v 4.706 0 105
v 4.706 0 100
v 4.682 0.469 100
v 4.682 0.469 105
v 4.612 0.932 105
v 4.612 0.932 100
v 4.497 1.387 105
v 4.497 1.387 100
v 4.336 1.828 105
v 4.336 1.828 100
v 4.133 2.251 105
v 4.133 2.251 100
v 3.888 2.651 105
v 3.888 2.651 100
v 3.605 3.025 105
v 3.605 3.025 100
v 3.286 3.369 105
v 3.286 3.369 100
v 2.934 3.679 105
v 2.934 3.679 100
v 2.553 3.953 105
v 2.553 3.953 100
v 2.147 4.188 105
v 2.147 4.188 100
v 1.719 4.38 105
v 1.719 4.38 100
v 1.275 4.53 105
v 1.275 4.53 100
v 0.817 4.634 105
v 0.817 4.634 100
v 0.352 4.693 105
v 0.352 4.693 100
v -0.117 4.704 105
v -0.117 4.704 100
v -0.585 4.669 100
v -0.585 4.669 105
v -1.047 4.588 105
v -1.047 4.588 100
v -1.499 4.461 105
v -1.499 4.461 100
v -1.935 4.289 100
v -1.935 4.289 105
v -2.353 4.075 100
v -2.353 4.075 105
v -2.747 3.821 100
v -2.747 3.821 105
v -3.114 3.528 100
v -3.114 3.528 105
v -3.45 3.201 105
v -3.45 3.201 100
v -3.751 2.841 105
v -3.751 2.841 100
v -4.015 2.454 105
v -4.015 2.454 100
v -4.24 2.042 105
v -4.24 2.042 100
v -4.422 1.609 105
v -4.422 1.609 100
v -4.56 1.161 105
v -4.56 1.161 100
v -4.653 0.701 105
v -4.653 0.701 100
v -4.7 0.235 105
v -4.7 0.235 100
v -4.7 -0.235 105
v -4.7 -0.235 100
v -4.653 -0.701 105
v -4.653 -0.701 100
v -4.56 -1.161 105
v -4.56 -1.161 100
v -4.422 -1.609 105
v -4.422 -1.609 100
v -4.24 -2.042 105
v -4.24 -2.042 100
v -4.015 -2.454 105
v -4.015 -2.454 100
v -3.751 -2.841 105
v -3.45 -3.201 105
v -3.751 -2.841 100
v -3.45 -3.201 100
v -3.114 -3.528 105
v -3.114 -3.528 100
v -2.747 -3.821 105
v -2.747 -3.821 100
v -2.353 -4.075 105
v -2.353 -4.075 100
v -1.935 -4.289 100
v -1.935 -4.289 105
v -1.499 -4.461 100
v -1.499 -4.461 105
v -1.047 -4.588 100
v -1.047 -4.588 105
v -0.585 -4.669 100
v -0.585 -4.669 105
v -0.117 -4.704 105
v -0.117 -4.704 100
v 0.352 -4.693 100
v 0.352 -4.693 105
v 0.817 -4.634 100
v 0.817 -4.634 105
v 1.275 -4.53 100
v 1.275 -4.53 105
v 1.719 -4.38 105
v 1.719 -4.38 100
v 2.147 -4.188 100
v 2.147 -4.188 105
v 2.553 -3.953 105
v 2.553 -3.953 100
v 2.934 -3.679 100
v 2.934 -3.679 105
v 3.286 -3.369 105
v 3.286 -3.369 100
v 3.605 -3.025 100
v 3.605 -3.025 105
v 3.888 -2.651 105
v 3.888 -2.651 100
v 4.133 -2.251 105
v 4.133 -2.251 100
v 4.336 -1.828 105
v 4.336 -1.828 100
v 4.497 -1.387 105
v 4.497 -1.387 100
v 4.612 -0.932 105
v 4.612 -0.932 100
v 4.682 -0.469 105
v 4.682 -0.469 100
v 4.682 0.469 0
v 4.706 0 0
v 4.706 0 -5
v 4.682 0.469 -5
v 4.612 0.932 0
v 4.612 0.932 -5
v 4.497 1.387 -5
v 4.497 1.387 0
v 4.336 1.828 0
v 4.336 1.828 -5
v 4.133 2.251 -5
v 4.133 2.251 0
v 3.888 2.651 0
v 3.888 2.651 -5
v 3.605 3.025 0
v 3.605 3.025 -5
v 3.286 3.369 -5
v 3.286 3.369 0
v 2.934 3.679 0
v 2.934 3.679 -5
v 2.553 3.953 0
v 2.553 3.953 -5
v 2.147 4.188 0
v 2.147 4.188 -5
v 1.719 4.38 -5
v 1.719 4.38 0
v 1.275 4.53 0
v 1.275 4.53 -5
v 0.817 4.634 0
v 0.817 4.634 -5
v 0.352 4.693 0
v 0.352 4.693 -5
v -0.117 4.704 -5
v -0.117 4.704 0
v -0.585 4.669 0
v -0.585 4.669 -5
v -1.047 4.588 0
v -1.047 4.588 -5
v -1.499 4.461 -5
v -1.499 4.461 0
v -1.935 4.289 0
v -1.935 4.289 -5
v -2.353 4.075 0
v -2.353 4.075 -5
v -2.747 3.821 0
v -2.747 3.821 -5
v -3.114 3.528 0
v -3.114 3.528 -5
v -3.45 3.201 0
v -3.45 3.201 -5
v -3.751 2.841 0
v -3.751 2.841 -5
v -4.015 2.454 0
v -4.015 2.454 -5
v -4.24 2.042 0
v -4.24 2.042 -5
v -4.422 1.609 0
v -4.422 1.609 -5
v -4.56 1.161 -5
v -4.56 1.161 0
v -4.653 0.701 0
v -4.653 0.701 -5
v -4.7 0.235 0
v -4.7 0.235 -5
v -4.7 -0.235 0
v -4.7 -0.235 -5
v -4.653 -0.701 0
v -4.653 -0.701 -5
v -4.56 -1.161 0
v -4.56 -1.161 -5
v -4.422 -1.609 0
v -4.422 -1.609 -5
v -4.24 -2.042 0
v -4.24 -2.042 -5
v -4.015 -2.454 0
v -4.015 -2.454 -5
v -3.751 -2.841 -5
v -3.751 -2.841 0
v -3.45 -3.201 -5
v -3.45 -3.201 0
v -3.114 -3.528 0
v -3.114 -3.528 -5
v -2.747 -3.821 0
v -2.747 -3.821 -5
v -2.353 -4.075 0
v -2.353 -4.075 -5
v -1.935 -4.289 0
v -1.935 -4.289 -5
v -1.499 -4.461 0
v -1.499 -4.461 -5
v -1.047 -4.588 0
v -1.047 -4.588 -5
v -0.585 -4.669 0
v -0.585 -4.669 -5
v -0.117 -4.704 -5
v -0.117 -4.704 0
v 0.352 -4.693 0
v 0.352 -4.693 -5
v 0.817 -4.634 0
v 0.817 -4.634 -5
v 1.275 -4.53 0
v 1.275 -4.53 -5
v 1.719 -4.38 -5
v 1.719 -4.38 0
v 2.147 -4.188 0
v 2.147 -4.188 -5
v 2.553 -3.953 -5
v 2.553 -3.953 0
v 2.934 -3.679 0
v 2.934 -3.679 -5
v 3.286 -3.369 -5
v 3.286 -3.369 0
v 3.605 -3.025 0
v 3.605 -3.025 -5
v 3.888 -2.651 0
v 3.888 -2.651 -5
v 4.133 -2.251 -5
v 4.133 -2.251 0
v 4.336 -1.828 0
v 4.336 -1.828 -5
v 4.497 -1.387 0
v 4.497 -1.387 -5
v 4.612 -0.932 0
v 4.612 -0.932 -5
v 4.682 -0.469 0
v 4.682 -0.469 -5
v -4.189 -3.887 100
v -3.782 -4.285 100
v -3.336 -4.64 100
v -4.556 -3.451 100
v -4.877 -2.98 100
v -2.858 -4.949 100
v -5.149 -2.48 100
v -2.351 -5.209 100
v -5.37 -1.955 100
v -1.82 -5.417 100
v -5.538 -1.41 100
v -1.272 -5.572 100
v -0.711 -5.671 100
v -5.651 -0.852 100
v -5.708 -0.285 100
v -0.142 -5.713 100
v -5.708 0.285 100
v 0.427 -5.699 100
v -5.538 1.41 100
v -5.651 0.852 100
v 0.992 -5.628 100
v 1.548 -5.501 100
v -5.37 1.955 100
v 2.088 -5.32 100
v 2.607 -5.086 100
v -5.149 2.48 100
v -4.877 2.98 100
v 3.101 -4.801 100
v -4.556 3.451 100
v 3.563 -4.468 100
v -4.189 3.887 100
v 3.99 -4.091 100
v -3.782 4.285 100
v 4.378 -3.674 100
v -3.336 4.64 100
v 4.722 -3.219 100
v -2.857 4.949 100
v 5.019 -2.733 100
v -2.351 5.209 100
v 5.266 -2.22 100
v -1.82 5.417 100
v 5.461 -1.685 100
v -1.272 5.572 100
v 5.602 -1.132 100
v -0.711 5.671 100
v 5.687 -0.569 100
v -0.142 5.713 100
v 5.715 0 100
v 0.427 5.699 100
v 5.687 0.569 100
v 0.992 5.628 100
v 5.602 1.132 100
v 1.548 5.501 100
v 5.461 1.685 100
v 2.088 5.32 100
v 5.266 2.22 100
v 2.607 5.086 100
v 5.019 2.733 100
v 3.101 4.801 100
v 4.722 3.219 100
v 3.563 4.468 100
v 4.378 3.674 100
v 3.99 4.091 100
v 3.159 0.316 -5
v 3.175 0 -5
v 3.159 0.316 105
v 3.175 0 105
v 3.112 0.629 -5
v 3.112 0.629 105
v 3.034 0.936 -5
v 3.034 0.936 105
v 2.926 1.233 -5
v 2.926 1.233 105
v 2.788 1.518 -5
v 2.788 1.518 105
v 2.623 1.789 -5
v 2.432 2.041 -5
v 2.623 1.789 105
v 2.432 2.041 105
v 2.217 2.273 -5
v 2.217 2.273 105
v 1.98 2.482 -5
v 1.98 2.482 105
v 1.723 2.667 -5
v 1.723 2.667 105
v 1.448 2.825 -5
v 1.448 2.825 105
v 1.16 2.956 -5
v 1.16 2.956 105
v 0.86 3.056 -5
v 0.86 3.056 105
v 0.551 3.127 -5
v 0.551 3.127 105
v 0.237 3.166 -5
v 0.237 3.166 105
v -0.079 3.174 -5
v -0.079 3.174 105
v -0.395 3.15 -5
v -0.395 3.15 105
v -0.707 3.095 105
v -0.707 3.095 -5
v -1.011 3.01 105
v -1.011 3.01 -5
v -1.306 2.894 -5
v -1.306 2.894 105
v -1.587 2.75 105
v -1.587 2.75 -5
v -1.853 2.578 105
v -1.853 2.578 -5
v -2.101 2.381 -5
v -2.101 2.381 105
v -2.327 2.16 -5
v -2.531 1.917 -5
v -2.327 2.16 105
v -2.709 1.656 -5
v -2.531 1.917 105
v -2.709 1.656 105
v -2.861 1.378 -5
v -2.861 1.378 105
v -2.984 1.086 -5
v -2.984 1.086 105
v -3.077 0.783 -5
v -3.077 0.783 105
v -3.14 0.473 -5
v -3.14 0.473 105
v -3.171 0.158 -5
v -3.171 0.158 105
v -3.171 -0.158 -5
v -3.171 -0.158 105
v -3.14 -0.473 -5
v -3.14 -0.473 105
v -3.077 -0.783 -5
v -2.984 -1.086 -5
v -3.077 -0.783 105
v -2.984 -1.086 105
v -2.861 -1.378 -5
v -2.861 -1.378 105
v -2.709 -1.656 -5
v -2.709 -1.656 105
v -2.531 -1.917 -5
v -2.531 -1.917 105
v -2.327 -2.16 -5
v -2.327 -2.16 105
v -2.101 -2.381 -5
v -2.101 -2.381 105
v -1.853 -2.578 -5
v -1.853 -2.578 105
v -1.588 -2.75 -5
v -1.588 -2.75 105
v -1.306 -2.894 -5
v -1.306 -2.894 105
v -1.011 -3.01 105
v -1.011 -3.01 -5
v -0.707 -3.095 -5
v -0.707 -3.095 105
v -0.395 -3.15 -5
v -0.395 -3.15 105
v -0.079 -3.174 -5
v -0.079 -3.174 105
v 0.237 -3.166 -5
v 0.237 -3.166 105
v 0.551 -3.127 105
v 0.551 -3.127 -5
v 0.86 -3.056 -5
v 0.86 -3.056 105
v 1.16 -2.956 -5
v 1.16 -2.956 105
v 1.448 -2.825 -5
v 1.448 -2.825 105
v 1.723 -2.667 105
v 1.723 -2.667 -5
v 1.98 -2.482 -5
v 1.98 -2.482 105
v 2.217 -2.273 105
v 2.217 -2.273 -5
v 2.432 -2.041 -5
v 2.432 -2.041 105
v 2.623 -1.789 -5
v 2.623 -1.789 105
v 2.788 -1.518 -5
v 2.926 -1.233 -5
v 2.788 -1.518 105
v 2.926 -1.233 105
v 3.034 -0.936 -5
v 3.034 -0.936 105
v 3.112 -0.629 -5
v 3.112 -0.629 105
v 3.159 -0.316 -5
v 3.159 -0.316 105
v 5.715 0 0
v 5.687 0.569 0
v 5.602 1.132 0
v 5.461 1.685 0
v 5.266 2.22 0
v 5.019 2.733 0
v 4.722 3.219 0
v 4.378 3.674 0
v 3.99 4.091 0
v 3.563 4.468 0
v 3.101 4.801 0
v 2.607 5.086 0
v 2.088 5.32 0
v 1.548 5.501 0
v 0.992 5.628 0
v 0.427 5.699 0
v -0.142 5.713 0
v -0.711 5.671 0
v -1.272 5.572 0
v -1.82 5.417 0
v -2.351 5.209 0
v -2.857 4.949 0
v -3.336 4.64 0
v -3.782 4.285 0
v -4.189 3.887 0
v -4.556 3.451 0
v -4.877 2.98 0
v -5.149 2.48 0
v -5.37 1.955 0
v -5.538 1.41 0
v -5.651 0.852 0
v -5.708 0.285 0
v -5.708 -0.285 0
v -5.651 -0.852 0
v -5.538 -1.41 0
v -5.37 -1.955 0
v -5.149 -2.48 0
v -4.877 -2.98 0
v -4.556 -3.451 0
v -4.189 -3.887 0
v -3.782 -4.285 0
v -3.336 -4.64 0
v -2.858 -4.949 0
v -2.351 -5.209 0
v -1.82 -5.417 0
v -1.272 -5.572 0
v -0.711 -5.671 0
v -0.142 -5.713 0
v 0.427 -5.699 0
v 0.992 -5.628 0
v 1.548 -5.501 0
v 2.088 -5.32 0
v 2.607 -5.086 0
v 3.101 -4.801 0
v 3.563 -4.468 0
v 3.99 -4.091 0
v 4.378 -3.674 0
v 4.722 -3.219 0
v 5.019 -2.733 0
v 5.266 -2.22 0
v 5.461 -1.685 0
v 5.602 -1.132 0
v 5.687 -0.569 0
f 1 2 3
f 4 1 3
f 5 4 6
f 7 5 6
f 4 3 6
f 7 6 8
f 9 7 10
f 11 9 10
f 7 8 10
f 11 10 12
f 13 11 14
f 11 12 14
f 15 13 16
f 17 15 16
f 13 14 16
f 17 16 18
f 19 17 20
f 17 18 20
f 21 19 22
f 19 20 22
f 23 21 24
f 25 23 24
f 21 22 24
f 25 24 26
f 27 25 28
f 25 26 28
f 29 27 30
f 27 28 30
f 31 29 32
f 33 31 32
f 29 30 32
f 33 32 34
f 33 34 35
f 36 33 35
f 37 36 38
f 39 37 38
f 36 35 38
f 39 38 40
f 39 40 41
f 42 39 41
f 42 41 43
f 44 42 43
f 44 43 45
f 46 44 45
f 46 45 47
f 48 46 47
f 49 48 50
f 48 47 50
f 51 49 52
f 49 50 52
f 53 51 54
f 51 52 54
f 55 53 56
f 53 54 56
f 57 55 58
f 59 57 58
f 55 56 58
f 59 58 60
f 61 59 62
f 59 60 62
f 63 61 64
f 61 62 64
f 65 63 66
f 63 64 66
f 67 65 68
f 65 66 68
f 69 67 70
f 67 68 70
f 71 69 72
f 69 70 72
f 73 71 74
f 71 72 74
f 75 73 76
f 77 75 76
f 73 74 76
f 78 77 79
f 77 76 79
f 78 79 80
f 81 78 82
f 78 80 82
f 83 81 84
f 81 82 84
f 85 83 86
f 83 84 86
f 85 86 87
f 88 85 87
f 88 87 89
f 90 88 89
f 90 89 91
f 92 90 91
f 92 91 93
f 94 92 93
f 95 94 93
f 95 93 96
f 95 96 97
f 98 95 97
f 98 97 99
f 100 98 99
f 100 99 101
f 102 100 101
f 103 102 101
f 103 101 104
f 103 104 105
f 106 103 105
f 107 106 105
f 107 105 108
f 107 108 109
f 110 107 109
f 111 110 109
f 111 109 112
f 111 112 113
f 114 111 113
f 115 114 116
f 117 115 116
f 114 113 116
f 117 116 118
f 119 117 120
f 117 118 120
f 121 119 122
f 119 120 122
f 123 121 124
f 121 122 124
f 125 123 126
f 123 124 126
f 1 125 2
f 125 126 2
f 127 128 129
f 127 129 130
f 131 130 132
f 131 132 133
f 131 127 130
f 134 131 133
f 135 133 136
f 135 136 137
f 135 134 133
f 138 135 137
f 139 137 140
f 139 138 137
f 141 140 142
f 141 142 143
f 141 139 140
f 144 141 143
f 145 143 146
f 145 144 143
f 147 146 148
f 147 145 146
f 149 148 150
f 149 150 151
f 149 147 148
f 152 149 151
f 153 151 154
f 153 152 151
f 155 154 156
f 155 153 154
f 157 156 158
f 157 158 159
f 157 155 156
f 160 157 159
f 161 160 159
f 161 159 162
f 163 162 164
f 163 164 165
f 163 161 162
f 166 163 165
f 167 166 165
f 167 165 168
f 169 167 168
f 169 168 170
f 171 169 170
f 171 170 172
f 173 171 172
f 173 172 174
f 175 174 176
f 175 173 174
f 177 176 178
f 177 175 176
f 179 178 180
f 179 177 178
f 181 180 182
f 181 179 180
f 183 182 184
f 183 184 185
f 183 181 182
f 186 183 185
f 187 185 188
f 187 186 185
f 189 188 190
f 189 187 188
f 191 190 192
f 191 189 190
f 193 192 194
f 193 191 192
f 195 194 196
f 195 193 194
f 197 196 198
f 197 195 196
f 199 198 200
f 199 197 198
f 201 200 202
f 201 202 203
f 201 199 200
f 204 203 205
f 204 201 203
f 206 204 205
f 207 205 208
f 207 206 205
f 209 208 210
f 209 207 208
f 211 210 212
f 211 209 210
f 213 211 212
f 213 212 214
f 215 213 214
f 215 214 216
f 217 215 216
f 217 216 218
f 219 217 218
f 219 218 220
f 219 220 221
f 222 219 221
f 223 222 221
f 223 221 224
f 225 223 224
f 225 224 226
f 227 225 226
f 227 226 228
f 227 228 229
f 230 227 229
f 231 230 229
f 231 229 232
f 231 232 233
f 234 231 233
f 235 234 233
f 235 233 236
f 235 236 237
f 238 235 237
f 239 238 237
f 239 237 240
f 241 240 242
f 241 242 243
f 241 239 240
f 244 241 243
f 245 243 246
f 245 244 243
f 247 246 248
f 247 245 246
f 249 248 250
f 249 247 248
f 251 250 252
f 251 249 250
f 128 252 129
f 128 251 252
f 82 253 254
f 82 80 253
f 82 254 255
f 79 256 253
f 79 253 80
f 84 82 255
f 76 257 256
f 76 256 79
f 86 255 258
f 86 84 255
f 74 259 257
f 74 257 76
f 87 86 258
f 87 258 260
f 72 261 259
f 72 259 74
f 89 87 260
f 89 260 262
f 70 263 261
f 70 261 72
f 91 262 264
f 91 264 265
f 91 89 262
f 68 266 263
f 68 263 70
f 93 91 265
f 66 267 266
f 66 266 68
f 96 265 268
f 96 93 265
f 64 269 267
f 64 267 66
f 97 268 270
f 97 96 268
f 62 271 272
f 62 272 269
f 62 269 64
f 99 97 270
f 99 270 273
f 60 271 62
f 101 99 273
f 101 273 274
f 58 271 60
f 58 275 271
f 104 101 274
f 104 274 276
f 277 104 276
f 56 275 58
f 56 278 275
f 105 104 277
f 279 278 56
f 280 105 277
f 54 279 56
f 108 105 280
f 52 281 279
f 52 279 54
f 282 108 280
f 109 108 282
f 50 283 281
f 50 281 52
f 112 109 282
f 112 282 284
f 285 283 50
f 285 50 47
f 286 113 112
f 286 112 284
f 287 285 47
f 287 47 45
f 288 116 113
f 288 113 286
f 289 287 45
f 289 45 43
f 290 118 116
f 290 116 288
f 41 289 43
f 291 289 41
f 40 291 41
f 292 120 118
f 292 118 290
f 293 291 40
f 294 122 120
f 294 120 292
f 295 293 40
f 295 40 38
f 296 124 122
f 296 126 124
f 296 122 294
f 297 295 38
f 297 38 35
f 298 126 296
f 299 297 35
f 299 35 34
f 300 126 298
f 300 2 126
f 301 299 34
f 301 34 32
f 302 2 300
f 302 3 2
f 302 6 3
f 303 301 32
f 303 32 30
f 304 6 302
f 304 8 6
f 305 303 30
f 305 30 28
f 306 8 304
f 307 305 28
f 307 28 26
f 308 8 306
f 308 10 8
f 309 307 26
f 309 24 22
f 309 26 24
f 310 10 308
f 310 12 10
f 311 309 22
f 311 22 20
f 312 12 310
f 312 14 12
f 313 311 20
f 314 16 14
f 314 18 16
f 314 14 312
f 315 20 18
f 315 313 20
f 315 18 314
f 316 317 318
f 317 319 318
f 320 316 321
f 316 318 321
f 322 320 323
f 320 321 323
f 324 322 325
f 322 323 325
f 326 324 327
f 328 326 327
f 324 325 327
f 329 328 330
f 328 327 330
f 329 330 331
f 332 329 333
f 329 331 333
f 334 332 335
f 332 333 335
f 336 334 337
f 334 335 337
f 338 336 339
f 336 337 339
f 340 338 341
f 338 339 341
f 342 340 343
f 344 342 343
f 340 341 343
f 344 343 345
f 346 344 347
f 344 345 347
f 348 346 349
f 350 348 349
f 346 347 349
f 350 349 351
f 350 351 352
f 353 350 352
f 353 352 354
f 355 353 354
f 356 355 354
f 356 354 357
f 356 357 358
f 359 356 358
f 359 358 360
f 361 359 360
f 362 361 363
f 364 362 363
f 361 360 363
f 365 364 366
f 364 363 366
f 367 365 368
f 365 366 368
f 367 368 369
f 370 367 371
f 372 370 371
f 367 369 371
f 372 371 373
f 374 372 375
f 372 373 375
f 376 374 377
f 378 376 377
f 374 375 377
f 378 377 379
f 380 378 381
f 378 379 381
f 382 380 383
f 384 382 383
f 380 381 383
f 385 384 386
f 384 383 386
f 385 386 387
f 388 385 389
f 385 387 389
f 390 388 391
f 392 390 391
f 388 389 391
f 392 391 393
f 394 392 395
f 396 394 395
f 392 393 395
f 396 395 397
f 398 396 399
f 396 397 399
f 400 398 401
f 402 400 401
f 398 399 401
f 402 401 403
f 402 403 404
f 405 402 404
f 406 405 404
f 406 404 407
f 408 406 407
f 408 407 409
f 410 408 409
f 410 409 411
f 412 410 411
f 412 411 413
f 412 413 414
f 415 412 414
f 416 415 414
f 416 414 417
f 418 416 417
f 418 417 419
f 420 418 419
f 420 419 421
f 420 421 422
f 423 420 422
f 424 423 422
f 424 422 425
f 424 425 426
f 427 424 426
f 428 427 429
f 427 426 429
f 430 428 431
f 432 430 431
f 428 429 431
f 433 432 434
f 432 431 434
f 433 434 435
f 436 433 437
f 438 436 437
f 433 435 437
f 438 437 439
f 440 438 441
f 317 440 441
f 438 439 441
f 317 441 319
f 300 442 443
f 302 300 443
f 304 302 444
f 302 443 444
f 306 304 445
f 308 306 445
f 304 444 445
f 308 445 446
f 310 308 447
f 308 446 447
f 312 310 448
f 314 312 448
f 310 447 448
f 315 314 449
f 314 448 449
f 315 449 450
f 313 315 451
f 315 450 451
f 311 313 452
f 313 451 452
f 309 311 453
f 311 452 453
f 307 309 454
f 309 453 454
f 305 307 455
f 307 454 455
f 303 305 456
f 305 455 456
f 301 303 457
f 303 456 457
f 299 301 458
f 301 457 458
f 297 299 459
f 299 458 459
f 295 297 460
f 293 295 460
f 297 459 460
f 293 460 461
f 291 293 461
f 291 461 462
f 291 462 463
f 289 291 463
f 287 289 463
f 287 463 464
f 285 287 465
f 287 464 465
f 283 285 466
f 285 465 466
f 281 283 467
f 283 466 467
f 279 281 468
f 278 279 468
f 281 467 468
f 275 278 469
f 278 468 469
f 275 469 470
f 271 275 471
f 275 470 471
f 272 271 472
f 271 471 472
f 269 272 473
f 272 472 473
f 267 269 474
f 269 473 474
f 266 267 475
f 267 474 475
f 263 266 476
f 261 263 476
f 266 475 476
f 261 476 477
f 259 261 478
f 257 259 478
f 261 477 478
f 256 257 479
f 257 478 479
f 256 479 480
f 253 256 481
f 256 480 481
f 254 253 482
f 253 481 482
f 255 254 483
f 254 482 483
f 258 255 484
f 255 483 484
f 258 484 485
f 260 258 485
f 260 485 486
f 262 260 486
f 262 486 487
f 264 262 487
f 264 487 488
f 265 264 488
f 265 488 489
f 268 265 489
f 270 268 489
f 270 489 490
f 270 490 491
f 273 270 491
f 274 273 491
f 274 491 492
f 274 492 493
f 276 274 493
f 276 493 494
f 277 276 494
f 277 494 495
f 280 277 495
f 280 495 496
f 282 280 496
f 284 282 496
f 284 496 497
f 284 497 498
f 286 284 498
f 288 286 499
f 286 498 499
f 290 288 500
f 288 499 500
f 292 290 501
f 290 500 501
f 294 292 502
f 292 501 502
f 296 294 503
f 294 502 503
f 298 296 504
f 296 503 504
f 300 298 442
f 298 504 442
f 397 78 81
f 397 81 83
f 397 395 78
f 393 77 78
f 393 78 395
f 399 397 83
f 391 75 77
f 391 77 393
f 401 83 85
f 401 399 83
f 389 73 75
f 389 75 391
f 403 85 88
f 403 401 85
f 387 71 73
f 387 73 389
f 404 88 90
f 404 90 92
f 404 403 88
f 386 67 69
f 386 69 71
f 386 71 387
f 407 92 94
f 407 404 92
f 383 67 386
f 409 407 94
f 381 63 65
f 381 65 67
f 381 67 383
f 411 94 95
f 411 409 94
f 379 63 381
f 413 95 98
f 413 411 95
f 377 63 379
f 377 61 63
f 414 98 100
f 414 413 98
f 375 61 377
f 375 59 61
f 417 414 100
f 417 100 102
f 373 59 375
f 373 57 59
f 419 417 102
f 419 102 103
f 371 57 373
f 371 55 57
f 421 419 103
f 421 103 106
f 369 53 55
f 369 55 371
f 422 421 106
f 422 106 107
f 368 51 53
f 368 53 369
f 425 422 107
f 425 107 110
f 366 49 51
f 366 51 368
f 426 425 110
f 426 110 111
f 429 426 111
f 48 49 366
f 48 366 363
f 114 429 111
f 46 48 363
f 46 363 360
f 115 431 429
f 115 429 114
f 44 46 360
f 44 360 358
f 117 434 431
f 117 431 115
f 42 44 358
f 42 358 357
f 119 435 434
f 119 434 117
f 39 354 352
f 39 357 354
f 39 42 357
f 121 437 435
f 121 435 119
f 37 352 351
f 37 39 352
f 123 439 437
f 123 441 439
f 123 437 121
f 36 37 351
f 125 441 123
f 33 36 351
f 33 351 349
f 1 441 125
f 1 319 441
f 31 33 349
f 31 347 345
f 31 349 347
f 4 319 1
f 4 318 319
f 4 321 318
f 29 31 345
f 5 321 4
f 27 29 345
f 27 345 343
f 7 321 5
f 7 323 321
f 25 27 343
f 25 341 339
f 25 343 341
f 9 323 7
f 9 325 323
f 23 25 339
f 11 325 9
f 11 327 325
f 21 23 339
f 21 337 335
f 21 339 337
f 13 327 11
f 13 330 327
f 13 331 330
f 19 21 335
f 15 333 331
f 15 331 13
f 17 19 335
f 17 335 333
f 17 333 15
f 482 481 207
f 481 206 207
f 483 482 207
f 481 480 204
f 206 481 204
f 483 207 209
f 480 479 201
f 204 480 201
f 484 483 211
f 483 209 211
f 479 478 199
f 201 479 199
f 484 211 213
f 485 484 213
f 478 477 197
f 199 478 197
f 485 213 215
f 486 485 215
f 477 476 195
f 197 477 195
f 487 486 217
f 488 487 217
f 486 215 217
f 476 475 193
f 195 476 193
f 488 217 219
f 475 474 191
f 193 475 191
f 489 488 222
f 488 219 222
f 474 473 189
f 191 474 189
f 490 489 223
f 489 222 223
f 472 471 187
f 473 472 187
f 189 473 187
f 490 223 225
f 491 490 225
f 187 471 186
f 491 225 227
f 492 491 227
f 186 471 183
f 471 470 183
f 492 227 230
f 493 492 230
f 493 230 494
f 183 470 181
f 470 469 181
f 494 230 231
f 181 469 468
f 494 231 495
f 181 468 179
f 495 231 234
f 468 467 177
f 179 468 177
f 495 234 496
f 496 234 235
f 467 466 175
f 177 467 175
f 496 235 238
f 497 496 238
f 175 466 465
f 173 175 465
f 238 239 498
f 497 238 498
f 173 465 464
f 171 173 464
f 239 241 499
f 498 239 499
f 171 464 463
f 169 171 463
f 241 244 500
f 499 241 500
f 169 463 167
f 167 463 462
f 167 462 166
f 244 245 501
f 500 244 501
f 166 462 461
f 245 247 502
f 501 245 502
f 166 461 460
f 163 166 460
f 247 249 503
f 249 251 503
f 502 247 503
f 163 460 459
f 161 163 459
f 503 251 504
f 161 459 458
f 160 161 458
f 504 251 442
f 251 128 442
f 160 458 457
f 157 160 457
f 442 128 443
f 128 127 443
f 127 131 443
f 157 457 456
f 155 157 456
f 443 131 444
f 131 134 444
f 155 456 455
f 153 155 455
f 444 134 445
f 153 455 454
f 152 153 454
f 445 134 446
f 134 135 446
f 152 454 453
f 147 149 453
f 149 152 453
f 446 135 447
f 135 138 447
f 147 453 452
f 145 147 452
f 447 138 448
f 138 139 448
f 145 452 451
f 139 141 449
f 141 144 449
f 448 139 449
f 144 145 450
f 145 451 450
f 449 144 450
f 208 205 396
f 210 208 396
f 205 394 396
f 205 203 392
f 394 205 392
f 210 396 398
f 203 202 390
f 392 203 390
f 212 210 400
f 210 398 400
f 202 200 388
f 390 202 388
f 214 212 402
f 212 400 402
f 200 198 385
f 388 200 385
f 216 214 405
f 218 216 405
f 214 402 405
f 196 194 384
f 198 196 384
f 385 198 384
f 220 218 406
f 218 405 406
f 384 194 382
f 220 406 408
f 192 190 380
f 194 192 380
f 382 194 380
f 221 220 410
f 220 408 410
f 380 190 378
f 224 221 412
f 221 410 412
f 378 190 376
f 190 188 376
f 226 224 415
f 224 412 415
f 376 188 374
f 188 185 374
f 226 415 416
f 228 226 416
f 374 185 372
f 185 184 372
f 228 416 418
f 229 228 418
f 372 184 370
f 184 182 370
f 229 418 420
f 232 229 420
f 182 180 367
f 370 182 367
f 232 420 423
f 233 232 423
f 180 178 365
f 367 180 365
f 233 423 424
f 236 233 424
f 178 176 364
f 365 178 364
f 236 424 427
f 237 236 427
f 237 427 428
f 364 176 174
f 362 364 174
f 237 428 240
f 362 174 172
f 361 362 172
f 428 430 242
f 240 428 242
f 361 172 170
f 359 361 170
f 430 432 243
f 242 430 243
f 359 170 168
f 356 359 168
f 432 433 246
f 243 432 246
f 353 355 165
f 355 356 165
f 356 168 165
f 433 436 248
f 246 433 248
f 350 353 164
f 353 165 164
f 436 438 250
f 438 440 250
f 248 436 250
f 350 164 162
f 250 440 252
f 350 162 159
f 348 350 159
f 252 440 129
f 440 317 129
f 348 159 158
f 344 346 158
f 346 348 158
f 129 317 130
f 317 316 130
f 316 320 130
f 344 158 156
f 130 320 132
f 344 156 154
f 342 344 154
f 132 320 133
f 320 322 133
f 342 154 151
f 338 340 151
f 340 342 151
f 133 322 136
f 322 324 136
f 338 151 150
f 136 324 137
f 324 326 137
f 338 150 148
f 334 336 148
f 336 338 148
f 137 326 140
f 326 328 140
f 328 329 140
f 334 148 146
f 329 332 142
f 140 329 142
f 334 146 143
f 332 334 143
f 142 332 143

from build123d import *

# Parameters (mm, degrees)
F0_R     = 5.715
F0_R_2   = 3.175
F1_DEPTH = 100
F2_R     = 4.70576
F2_R_2   = 3.175
F3_DEPTH = 5
F4_R     = 4.70576
F4_R_2   = 3.175
F5_DEPTH = 5


with BuildPart() as f1:
    # F0 (on Top) → F1 (new body)
    with BuildSketch(Plane.XY):
        Circle(F0_R)
        Circle(F0_R_2, mode=Mode.SUBTRACT)
    extrude(amount=F1_DEPTH)

    # F2 (on face) → F3 (join)
    with BuildSketch(Plane.XY.offset(100)):
        Circle(F2_R)
        Circle(F2_R_2, mode=Mode.SUBTRACT)
    extrude(amount=F3_DEPTH)

    # F4 (on Top) → F5 (join)
    with BuildSketch(Plane.XY):
        Circle(F4_R)
        Circle(F4_R_2, mode=Mode.SUBTRACT)
    extrude(amount=-F5_DEPTH)


solid = f1.part
